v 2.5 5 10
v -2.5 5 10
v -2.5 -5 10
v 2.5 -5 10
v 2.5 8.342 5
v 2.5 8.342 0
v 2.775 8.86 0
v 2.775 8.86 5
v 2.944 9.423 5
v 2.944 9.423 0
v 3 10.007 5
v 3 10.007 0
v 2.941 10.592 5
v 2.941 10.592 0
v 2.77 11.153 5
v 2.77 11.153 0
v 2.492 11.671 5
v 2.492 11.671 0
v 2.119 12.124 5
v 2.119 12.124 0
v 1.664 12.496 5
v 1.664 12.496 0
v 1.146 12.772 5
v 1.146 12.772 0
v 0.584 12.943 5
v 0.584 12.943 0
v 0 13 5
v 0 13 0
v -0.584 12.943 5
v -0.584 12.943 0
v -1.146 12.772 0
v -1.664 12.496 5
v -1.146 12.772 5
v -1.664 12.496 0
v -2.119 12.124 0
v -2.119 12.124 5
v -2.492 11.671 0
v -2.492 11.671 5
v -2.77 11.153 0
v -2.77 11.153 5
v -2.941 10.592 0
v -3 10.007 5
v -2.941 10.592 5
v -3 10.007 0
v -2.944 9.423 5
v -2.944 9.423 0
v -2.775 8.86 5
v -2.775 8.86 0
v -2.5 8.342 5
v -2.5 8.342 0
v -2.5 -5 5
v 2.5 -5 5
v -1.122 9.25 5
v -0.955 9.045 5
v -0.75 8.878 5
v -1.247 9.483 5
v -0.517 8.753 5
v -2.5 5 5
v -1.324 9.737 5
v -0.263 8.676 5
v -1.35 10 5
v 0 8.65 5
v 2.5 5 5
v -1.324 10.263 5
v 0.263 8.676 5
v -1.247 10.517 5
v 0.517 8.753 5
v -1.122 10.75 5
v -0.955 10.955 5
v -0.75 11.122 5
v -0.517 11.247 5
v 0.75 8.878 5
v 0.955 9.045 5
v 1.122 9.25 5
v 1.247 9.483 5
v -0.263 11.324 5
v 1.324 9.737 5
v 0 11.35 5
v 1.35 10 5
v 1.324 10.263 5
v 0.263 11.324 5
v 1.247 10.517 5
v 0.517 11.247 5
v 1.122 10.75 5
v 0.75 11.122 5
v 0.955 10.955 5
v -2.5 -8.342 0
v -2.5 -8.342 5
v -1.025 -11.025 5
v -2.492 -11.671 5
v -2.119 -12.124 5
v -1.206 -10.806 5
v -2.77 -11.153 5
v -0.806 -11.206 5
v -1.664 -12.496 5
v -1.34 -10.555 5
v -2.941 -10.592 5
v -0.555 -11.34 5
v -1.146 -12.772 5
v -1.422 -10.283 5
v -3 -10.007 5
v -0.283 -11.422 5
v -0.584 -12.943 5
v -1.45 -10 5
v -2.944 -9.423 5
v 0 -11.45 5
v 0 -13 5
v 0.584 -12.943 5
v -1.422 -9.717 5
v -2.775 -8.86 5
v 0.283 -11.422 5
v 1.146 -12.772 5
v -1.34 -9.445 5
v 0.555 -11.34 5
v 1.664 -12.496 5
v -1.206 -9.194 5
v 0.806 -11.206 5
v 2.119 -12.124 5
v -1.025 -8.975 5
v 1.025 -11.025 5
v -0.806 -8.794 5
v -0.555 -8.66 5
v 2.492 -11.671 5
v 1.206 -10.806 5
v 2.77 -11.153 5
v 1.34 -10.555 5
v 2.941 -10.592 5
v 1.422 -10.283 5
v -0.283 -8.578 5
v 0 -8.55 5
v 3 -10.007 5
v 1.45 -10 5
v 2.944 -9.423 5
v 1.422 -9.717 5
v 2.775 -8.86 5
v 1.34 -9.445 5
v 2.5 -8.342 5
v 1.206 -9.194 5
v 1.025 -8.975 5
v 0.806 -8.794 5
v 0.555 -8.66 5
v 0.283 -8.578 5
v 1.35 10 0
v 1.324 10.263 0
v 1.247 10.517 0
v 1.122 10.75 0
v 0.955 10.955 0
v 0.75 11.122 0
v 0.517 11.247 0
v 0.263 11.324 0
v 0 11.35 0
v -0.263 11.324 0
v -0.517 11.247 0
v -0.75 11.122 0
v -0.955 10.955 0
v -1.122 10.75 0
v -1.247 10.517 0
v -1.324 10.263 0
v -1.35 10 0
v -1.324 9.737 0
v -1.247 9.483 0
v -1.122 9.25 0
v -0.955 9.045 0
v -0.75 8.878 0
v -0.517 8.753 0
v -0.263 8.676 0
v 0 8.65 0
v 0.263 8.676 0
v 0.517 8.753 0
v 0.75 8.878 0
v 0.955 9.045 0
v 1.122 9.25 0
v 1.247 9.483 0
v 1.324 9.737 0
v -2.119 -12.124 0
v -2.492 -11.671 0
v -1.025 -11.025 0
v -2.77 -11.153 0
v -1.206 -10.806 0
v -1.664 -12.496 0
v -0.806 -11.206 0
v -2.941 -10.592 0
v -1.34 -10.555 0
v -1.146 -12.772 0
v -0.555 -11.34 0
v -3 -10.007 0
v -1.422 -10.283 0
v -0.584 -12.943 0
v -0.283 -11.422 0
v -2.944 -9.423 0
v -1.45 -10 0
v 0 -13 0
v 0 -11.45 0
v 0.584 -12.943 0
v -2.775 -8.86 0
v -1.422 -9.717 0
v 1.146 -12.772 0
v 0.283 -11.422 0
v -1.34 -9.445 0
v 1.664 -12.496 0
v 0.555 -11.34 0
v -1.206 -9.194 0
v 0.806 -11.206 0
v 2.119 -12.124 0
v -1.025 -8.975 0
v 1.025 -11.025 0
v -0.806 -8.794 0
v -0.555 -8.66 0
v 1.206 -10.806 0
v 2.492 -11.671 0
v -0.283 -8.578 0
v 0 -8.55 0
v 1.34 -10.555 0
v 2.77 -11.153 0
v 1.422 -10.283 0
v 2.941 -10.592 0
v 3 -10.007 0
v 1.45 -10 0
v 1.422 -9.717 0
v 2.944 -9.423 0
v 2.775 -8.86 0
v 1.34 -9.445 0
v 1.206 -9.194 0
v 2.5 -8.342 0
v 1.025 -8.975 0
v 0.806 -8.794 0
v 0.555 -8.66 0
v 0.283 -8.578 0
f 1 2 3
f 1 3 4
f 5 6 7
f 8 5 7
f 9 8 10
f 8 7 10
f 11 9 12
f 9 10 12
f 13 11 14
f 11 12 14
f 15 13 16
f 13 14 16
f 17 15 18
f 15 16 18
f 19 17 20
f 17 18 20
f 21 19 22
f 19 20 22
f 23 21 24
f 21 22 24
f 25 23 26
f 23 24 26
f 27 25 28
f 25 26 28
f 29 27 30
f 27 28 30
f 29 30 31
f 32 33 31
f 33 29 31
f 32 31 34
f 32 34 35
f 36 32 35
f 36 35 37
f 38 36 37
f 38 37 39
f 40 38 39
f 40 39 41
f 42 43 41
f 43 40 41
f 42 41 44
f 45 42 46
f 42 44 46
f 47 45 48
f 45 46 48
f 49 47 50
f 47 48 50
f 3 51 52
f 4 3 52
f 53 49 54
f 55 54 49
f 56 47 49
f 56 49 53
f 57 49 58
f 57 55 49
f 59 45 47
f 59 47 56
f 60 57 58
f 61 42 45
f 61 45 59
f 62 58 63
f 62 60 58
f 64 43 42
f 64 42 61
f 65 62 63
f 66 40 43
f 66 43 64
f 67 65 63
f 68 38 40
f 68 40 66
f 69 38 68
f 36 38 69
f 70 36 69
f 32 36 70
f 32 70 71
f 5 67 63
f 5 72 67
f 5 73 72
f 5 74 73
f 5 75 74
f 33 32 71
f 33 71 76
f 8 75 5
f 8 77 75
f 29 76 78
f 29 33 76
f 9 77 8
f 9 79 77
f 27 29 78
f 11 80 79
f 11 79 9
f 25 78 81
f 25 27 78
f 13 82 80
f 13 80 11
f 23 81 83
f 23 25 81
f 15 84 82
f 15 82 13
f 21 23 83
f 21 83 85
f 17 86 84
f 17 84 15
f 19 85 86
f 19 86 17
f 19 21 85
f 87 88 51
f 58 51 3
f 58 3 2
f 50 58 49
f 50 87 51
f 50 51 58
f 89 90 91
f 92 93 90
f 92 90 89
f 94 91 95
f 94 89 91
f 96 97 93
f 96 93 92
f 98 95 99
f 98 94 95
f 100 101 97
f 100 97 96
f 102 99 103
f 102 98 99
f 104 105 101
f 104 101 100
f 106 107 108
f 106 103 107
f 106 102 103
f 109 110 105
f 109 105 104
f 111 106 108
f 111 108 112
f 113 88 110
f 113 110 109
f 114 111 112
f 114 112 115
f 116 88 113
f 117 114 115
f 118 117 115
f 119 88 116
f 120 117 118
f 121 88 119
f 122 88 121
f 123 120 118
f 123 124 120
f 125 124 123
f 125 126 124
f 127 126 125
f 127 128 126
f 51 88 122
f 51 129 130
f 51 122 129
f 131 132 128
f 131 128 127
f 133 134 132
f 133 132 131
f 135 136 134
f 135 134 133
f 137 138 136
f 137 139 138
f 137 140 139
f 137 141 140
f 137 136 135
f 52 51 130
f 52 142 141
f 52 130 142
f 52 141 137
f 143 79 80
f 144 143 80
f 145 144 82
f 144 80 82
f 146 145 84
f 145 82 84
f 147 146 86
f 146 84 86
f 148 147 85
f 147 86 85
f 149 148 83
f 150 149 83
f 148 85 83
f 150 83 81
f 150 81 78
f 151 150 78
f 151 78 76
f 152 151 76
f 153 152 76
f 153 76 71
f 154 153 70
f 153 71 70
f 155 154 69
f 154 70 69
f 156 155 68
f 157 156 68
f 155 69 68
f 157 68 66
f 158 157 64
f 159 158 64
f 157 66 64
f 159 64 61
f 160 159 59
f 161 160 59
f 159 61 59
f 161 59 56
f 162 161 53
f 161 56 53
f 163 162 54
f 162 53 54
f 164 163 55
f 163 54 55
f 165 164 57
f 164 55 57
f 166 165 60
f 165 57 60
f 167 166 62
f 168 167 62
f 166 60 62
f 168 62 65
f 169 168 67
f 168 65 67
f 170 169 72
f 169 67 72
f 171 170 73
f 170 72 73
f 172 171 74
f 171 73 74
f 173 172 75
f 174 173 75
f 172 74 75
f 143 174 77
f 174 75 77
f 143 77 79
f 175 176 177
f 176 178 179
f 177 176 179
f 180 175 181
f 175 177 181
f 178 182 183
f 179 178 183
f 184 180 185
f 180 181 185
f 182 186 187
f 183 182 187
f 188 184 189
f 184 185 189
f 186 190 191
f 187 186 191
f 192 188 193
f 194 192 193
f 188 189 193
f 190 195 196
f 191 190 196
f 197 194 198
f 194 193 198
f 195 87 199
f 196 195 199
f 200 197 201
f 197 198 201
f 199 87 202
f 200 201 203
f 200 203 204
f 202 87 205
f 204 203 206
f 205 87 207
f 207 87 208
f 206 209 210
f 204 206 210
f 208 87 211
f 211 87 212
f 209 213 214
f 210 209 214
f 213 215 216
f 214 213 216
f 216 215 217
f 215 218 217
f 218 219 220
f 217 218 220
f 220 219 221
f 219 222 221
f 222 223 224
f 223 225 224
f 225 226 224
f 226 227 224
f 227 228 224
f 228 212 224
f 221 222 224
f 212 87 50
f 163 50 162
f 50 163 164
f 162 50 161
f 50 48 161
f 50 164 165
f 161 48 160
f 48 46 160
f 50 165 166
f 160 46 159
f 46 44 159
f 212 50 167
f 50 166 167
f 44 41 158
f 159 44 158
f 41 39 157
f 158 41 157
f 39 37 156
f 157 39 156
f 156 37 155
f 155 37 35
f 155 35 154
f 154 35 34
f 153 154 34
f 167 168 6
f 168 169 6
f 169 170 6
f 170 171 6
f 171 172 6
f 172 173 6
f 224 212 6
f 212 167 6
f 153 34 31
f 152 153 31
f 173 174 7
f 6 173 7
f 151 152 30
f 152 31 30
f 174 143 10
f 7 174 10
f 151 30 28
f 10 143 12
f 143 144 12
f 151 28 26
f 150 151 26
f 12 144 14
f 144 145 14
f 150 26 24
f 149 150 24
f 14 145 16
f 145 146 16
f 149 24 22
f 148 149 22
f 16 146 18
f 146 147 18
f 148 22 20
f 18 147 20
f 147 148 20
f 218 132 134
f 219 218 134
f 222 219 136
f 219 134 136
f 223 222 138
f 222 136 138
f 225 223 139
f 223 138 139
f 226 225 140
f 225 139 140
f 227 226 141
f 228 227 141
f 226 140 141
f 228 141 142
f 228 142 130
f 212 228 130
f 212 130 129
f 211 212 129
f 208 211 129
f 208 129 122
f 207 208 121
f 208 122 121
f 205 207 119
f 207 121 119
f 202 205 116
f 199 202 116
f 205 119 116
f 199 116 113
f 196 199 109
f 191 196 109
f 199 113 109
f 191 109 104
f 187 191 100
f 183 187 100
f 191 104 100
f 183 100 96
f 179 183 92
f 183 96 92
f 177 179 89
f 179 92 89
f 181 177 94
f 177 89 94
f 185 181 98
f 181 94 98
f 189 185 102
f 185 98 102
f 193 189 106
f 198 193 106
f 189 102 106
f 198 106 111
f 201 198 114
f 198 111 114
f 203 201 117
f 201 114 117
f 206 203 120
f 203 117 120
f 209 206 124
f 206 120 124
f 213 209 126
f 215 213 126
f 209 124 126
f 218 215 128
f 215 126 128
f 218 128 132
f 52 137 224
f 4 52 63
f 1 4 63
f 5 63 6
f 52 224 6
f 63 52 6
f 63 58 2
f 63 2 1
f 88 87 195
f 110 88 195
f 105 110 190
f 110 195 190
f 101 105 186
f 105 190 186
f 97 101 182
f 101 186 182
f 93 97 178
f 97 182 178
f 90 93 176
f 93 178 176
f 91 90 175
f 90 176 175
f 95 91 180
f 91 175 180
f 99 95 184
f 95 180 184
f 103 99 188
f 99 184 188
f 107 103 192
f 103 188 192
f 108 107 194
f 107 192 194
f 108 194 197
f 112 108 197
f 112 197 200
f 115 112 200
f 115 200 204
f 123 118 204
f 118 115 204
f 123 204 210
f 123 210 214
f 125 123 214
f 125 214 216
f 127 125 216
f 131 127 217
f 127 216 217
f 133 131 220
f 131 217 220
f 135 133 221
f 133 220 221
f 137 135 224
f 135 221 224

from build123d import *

# Parameters (mm, degrees)
F0_W      = 5
F0_H      = 20
F1_DEPTH  = 5
F2_R      = 3
F3_DEPTH  = 5
F4_R      = 3
F5_DEPTH  = 5
F6_R      = 1.35
F7_DEPTH  = 5
F8_R      = 1.45
F9_DEPTH  = 5
F10_W     = 5
F10_H     = 10
F11_DEPTH = 5


with BuildPart() as f1:
    # F0 (on Top) → F1 (new body)
    with BuildSketch(Plane.XY):
        Rectangle(F0_W, F0_H)
    extrude(amount=F1_DEPTH)

    # F2 (on Top) → F3 (join)
    with BuildSketch(Plane.XY):
        with Locations((0, 10)):
            Circle(F2_R)
    extrude(amount=F3_DEPTH)

    # F4 (on Top) → F5 (join)
    with BuildSketch(Plane.XY):
        with Locations((0, -10)):
            Circle(F4_R)
    extrude(amount=F5_DEPTH)

    # F6 (on face) → F7 (cut)
    with BuildSketch(Plane.XY.offset(5)):
        with Locations((0, 10)):
            Circle(F6_R)
    extrude(amount=-F7_DEPTH, mode=Mode.SUBTRACT)

    # F8 (on face) → F9 (cut)
    with BuildSketch(Plane.XY.offset(5)):
        with Locations((0, -10)):
            Circle(F8_R)
    extrude(amount=-F9_DEPTH, mode=Mode.SUBTRACT)

    # F10 (on face) → F11 (join)
    with BuildSketch(Plane.XY.offset(5)):
        Rectangle(F10_W, F10_H)
    extrude(amount=F11_DEPTH)


solid = f1.part
